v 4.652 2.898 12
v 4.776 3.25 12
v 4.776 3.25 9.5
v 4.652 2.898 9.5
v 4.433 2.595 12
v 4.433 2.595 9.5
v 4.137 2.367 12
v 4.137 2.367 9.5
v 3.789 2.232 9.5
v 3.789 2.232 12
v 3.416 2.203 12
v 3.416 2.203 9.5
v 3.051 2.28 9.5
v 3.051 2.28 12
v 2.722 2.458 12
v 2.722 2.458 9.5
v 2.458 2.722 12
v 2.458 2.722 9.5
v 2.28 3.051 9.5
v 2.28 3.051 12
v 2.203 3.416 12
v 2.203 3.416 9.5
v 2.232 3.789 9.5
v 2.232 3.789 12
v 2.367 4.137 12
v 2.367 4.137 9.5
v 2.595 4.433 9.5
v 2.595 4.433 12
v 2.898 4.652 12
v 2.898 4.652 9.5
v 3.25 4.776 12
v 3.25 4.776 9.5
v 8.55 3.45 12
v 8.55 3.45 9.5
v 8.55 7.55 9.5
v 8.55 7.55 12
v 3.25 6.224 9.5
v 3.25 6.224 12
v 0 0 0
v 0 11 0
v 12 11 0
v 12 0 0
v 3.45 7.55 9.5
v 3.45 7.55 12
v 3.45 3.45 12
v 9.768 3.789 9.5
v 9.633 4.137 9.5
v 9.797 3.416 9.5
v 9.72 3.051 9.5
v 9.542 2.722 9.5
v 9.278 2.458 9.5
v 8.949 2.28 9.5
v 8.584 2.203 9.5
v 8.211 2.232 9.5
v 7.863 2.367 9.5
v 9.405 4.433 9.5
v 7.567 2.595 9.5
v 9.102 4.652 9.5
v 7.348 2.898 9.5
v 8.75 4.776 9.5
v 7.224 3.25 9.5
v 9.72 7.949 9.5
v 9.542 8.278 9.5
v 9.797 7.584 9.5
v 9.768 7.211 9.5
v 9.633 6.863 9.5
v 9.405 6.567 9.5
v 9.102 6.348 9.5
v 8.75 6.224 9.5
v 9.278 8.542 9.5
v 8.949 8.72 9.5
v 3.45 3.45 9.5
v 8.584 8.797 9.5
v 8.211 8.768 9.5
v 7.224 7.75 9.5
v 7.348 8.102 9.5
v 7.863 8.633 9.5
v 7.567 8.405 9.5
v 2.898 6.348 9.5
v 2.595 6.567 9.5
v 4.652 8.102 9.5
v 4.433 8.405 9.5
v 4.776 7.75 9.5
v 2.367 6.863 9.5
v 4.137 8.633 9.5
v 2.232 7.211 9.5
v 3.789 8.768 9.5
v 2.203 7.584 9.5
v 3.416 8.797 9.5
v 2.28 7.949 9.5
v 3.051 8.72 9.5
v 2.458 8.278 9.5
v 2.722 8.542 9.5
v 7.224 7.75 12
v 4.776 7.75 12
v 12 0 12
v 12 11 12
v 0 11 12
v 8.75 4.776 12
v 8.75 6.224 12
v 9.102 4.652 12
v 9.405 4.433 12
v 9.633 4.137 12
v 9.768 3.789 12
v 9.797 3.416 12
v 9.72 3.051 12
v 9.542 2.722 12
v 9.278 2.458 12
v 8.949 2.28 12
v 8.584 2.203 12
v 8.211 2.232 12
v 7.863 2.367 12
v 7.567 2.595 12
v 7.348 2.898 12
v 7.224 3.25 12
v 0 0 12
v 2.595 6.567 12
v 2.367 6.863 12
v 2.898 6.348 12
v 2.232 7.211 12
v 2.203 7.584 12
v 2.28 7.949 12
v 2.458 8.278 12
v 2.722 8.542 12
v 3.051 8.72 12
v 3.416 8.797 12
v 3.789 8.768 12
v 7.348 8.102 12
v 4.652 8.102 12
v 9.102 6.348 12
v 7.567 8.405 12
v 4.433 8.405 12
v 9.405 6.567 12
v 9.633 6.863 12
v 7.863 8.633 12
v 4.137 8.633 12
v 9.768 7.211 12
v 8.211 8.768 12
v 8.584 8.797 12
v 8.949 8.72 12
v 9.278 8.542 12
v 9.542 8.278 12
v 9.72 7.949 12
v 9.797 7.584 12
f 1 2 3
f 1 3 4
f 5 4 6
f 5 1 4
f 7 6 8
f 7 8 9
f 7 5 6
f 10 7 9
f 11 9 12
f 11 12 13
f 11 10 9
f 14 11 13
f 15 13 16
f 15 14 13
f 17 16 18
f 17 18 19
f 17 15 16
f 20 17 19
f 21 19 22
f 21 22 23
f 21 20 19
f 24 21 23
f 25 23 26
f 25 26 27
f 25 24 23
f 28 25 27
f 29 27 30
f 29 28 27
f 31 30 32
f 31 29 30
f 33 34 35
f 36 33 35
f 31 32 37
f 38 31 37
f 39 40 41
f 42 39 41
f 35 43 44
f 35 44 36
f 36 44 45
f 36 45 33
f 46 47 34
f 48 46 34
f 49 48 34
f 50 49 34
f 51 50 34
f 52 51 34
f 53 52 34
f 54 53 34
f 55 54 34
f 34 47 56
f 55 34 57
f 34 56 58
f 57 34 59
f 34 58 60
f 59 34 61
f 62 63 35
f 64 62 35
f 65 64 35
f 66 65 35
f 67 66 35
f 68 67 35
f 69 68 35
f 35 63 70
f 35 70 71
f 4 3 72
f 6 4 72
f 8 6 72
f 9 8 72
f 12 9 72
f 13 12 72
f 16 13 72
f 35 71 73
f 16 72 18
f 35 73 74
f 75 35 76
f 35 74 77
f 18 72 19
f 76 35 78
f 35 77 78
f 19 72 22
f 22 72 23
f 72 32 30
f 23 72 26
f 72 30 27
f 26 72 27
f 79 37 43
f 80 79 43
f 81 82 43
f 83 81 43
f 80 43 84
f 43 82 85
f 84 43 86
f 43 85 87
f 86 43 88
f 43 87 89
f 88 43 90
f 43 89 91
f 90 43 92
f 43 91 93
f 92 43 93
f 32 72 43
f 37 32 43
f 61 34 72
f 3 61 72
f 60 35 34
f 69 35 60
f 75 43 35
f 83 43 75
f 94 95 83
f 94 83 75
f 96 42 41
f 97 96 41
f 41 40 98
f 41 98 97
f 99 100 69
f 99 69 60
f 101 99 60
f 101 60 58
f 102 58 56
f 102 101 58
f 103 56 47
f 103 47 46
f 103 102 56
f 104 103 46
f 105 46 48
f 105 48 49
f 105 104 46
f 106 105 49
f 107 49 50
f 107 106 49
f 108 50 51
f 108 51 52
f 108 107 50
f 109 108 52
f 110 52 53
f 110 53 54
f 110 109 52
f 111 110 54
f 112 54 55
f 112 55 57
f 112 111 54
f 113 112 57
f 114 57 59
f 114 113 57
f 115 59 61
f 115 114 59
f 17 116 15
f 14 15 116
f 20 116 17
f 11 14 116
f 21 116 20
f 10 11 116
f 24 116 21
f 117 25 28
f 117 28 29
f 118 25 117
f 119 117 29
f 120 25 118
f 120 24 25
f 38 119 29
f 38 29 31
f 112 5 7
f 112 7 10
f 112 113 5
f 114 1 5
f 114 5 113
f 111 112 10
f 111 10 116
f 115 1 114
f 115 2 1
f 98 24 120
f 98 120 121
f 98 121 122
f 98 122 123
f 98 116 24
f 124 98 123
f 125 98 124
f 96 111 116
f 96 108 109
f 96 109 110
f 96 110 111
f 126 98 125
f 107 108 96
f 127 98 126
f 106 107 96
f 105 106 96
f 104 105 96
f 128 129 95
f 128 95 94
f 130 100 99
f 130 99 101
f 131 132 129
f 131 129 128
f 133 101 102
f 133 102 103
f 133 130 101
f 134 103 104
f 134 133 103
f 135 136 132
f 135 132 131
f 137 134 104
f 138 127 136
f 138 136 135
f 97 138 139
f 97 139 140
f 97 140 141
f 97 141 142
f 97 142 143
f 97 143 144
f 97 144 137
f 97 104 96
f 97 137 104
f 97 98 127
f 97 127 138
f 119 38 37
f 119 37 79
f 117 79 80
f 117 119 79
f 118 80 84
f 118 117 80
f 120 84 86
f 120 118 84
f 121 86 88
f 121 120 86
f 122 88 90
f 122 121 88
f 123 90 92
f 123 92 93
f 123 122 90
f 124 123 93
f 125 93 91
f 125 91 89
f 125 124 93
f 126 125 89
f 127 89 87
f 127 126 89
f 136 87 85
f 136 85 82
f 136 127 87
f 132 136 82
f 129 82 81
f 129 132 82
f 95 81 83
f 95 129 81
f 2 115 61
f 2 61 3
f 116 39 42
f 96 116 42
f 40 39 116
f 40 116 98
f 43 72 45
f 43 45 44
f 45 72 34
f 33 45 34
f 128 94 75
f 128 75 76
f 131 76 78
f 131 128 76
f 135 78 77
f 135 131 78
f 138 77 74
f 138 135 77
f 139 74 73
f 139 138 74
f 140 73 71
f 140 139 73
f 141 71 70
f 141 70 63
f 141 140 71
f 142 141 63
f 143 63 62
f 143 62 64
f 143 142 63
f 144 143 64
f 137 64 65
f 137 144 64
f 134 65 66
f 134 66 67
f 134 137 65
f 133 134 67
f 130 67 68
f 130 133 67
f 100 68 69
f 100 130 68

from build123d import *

# Parameters (mm, degrees)
ESQUISSE1_W             = 12
ESQUISSE1_H             = 11
EXTRUSION1_DEPTH        = 12
ENL_V_MAT_EXTRU_1_DEPTH = 2.5
ESQUISSE3_W             = 5.1
ESQUISSE3_H             = 4.1
EXTRUSION2_DEPTH        = 2.5


with BuildPart() as part:
    # Esquisse1 → Extrusion1 (new body)
    with BuildSketch(Plane.XY):
        with Locations((6, 5.5)):
            Rectangle(ESQUISSE1_W, ESQUISSE1_H)
    extrude(amount=EXTRUSION1_DEPTH)

    # Esquisse2 → Enlèv. mat.-Extru.1 (cut)
    with BuildSketch(Plane.XY.offset(12)):
        with BuildLine():
            Line((4.775735082, 7.75), (7.224264918, 7.75))
            ThreePointArc((7.224264918, 7.75), (9.419238816, 8.419238816), (8.75, 6.224264918))
            Line((8.75, 6.224264918), (8.75, 4.775735082))
            ThreePointArc((8.75, 4.775735082), (9.419238816, 2.580761184), (7.224264918, 3.25))
            Line((7.224264918, 3.25), (4.775735082, 3.25))
            ThreePointArc((4.775735082, 3.25), (2.580761184, 2.580761184), (3.25, 4.775735082))
            Line((3.25, 4.775735082), (3.25, 6.224264918))
            ThreePointArc((3.25, 6.224264918), (2.580761184, 8.419238816), (4.775735082, 7.75))
        make_face()
    extrude(amount=-ENL_V_MAT_EXTRU_1_DEPTH, mode=Mode.SUBTRACT)

    # Esquisse3 → Extrusion2 (add)
    with BuildSketch(Plane.XY.offset(9.5)):
        with Locations((6, 5.5)):
            Rectangle(ESQUISSE3_W, ESQUISSE3_H)
    extrude(amount=EXTRUSION2_DEPTH)


solid = part.part
